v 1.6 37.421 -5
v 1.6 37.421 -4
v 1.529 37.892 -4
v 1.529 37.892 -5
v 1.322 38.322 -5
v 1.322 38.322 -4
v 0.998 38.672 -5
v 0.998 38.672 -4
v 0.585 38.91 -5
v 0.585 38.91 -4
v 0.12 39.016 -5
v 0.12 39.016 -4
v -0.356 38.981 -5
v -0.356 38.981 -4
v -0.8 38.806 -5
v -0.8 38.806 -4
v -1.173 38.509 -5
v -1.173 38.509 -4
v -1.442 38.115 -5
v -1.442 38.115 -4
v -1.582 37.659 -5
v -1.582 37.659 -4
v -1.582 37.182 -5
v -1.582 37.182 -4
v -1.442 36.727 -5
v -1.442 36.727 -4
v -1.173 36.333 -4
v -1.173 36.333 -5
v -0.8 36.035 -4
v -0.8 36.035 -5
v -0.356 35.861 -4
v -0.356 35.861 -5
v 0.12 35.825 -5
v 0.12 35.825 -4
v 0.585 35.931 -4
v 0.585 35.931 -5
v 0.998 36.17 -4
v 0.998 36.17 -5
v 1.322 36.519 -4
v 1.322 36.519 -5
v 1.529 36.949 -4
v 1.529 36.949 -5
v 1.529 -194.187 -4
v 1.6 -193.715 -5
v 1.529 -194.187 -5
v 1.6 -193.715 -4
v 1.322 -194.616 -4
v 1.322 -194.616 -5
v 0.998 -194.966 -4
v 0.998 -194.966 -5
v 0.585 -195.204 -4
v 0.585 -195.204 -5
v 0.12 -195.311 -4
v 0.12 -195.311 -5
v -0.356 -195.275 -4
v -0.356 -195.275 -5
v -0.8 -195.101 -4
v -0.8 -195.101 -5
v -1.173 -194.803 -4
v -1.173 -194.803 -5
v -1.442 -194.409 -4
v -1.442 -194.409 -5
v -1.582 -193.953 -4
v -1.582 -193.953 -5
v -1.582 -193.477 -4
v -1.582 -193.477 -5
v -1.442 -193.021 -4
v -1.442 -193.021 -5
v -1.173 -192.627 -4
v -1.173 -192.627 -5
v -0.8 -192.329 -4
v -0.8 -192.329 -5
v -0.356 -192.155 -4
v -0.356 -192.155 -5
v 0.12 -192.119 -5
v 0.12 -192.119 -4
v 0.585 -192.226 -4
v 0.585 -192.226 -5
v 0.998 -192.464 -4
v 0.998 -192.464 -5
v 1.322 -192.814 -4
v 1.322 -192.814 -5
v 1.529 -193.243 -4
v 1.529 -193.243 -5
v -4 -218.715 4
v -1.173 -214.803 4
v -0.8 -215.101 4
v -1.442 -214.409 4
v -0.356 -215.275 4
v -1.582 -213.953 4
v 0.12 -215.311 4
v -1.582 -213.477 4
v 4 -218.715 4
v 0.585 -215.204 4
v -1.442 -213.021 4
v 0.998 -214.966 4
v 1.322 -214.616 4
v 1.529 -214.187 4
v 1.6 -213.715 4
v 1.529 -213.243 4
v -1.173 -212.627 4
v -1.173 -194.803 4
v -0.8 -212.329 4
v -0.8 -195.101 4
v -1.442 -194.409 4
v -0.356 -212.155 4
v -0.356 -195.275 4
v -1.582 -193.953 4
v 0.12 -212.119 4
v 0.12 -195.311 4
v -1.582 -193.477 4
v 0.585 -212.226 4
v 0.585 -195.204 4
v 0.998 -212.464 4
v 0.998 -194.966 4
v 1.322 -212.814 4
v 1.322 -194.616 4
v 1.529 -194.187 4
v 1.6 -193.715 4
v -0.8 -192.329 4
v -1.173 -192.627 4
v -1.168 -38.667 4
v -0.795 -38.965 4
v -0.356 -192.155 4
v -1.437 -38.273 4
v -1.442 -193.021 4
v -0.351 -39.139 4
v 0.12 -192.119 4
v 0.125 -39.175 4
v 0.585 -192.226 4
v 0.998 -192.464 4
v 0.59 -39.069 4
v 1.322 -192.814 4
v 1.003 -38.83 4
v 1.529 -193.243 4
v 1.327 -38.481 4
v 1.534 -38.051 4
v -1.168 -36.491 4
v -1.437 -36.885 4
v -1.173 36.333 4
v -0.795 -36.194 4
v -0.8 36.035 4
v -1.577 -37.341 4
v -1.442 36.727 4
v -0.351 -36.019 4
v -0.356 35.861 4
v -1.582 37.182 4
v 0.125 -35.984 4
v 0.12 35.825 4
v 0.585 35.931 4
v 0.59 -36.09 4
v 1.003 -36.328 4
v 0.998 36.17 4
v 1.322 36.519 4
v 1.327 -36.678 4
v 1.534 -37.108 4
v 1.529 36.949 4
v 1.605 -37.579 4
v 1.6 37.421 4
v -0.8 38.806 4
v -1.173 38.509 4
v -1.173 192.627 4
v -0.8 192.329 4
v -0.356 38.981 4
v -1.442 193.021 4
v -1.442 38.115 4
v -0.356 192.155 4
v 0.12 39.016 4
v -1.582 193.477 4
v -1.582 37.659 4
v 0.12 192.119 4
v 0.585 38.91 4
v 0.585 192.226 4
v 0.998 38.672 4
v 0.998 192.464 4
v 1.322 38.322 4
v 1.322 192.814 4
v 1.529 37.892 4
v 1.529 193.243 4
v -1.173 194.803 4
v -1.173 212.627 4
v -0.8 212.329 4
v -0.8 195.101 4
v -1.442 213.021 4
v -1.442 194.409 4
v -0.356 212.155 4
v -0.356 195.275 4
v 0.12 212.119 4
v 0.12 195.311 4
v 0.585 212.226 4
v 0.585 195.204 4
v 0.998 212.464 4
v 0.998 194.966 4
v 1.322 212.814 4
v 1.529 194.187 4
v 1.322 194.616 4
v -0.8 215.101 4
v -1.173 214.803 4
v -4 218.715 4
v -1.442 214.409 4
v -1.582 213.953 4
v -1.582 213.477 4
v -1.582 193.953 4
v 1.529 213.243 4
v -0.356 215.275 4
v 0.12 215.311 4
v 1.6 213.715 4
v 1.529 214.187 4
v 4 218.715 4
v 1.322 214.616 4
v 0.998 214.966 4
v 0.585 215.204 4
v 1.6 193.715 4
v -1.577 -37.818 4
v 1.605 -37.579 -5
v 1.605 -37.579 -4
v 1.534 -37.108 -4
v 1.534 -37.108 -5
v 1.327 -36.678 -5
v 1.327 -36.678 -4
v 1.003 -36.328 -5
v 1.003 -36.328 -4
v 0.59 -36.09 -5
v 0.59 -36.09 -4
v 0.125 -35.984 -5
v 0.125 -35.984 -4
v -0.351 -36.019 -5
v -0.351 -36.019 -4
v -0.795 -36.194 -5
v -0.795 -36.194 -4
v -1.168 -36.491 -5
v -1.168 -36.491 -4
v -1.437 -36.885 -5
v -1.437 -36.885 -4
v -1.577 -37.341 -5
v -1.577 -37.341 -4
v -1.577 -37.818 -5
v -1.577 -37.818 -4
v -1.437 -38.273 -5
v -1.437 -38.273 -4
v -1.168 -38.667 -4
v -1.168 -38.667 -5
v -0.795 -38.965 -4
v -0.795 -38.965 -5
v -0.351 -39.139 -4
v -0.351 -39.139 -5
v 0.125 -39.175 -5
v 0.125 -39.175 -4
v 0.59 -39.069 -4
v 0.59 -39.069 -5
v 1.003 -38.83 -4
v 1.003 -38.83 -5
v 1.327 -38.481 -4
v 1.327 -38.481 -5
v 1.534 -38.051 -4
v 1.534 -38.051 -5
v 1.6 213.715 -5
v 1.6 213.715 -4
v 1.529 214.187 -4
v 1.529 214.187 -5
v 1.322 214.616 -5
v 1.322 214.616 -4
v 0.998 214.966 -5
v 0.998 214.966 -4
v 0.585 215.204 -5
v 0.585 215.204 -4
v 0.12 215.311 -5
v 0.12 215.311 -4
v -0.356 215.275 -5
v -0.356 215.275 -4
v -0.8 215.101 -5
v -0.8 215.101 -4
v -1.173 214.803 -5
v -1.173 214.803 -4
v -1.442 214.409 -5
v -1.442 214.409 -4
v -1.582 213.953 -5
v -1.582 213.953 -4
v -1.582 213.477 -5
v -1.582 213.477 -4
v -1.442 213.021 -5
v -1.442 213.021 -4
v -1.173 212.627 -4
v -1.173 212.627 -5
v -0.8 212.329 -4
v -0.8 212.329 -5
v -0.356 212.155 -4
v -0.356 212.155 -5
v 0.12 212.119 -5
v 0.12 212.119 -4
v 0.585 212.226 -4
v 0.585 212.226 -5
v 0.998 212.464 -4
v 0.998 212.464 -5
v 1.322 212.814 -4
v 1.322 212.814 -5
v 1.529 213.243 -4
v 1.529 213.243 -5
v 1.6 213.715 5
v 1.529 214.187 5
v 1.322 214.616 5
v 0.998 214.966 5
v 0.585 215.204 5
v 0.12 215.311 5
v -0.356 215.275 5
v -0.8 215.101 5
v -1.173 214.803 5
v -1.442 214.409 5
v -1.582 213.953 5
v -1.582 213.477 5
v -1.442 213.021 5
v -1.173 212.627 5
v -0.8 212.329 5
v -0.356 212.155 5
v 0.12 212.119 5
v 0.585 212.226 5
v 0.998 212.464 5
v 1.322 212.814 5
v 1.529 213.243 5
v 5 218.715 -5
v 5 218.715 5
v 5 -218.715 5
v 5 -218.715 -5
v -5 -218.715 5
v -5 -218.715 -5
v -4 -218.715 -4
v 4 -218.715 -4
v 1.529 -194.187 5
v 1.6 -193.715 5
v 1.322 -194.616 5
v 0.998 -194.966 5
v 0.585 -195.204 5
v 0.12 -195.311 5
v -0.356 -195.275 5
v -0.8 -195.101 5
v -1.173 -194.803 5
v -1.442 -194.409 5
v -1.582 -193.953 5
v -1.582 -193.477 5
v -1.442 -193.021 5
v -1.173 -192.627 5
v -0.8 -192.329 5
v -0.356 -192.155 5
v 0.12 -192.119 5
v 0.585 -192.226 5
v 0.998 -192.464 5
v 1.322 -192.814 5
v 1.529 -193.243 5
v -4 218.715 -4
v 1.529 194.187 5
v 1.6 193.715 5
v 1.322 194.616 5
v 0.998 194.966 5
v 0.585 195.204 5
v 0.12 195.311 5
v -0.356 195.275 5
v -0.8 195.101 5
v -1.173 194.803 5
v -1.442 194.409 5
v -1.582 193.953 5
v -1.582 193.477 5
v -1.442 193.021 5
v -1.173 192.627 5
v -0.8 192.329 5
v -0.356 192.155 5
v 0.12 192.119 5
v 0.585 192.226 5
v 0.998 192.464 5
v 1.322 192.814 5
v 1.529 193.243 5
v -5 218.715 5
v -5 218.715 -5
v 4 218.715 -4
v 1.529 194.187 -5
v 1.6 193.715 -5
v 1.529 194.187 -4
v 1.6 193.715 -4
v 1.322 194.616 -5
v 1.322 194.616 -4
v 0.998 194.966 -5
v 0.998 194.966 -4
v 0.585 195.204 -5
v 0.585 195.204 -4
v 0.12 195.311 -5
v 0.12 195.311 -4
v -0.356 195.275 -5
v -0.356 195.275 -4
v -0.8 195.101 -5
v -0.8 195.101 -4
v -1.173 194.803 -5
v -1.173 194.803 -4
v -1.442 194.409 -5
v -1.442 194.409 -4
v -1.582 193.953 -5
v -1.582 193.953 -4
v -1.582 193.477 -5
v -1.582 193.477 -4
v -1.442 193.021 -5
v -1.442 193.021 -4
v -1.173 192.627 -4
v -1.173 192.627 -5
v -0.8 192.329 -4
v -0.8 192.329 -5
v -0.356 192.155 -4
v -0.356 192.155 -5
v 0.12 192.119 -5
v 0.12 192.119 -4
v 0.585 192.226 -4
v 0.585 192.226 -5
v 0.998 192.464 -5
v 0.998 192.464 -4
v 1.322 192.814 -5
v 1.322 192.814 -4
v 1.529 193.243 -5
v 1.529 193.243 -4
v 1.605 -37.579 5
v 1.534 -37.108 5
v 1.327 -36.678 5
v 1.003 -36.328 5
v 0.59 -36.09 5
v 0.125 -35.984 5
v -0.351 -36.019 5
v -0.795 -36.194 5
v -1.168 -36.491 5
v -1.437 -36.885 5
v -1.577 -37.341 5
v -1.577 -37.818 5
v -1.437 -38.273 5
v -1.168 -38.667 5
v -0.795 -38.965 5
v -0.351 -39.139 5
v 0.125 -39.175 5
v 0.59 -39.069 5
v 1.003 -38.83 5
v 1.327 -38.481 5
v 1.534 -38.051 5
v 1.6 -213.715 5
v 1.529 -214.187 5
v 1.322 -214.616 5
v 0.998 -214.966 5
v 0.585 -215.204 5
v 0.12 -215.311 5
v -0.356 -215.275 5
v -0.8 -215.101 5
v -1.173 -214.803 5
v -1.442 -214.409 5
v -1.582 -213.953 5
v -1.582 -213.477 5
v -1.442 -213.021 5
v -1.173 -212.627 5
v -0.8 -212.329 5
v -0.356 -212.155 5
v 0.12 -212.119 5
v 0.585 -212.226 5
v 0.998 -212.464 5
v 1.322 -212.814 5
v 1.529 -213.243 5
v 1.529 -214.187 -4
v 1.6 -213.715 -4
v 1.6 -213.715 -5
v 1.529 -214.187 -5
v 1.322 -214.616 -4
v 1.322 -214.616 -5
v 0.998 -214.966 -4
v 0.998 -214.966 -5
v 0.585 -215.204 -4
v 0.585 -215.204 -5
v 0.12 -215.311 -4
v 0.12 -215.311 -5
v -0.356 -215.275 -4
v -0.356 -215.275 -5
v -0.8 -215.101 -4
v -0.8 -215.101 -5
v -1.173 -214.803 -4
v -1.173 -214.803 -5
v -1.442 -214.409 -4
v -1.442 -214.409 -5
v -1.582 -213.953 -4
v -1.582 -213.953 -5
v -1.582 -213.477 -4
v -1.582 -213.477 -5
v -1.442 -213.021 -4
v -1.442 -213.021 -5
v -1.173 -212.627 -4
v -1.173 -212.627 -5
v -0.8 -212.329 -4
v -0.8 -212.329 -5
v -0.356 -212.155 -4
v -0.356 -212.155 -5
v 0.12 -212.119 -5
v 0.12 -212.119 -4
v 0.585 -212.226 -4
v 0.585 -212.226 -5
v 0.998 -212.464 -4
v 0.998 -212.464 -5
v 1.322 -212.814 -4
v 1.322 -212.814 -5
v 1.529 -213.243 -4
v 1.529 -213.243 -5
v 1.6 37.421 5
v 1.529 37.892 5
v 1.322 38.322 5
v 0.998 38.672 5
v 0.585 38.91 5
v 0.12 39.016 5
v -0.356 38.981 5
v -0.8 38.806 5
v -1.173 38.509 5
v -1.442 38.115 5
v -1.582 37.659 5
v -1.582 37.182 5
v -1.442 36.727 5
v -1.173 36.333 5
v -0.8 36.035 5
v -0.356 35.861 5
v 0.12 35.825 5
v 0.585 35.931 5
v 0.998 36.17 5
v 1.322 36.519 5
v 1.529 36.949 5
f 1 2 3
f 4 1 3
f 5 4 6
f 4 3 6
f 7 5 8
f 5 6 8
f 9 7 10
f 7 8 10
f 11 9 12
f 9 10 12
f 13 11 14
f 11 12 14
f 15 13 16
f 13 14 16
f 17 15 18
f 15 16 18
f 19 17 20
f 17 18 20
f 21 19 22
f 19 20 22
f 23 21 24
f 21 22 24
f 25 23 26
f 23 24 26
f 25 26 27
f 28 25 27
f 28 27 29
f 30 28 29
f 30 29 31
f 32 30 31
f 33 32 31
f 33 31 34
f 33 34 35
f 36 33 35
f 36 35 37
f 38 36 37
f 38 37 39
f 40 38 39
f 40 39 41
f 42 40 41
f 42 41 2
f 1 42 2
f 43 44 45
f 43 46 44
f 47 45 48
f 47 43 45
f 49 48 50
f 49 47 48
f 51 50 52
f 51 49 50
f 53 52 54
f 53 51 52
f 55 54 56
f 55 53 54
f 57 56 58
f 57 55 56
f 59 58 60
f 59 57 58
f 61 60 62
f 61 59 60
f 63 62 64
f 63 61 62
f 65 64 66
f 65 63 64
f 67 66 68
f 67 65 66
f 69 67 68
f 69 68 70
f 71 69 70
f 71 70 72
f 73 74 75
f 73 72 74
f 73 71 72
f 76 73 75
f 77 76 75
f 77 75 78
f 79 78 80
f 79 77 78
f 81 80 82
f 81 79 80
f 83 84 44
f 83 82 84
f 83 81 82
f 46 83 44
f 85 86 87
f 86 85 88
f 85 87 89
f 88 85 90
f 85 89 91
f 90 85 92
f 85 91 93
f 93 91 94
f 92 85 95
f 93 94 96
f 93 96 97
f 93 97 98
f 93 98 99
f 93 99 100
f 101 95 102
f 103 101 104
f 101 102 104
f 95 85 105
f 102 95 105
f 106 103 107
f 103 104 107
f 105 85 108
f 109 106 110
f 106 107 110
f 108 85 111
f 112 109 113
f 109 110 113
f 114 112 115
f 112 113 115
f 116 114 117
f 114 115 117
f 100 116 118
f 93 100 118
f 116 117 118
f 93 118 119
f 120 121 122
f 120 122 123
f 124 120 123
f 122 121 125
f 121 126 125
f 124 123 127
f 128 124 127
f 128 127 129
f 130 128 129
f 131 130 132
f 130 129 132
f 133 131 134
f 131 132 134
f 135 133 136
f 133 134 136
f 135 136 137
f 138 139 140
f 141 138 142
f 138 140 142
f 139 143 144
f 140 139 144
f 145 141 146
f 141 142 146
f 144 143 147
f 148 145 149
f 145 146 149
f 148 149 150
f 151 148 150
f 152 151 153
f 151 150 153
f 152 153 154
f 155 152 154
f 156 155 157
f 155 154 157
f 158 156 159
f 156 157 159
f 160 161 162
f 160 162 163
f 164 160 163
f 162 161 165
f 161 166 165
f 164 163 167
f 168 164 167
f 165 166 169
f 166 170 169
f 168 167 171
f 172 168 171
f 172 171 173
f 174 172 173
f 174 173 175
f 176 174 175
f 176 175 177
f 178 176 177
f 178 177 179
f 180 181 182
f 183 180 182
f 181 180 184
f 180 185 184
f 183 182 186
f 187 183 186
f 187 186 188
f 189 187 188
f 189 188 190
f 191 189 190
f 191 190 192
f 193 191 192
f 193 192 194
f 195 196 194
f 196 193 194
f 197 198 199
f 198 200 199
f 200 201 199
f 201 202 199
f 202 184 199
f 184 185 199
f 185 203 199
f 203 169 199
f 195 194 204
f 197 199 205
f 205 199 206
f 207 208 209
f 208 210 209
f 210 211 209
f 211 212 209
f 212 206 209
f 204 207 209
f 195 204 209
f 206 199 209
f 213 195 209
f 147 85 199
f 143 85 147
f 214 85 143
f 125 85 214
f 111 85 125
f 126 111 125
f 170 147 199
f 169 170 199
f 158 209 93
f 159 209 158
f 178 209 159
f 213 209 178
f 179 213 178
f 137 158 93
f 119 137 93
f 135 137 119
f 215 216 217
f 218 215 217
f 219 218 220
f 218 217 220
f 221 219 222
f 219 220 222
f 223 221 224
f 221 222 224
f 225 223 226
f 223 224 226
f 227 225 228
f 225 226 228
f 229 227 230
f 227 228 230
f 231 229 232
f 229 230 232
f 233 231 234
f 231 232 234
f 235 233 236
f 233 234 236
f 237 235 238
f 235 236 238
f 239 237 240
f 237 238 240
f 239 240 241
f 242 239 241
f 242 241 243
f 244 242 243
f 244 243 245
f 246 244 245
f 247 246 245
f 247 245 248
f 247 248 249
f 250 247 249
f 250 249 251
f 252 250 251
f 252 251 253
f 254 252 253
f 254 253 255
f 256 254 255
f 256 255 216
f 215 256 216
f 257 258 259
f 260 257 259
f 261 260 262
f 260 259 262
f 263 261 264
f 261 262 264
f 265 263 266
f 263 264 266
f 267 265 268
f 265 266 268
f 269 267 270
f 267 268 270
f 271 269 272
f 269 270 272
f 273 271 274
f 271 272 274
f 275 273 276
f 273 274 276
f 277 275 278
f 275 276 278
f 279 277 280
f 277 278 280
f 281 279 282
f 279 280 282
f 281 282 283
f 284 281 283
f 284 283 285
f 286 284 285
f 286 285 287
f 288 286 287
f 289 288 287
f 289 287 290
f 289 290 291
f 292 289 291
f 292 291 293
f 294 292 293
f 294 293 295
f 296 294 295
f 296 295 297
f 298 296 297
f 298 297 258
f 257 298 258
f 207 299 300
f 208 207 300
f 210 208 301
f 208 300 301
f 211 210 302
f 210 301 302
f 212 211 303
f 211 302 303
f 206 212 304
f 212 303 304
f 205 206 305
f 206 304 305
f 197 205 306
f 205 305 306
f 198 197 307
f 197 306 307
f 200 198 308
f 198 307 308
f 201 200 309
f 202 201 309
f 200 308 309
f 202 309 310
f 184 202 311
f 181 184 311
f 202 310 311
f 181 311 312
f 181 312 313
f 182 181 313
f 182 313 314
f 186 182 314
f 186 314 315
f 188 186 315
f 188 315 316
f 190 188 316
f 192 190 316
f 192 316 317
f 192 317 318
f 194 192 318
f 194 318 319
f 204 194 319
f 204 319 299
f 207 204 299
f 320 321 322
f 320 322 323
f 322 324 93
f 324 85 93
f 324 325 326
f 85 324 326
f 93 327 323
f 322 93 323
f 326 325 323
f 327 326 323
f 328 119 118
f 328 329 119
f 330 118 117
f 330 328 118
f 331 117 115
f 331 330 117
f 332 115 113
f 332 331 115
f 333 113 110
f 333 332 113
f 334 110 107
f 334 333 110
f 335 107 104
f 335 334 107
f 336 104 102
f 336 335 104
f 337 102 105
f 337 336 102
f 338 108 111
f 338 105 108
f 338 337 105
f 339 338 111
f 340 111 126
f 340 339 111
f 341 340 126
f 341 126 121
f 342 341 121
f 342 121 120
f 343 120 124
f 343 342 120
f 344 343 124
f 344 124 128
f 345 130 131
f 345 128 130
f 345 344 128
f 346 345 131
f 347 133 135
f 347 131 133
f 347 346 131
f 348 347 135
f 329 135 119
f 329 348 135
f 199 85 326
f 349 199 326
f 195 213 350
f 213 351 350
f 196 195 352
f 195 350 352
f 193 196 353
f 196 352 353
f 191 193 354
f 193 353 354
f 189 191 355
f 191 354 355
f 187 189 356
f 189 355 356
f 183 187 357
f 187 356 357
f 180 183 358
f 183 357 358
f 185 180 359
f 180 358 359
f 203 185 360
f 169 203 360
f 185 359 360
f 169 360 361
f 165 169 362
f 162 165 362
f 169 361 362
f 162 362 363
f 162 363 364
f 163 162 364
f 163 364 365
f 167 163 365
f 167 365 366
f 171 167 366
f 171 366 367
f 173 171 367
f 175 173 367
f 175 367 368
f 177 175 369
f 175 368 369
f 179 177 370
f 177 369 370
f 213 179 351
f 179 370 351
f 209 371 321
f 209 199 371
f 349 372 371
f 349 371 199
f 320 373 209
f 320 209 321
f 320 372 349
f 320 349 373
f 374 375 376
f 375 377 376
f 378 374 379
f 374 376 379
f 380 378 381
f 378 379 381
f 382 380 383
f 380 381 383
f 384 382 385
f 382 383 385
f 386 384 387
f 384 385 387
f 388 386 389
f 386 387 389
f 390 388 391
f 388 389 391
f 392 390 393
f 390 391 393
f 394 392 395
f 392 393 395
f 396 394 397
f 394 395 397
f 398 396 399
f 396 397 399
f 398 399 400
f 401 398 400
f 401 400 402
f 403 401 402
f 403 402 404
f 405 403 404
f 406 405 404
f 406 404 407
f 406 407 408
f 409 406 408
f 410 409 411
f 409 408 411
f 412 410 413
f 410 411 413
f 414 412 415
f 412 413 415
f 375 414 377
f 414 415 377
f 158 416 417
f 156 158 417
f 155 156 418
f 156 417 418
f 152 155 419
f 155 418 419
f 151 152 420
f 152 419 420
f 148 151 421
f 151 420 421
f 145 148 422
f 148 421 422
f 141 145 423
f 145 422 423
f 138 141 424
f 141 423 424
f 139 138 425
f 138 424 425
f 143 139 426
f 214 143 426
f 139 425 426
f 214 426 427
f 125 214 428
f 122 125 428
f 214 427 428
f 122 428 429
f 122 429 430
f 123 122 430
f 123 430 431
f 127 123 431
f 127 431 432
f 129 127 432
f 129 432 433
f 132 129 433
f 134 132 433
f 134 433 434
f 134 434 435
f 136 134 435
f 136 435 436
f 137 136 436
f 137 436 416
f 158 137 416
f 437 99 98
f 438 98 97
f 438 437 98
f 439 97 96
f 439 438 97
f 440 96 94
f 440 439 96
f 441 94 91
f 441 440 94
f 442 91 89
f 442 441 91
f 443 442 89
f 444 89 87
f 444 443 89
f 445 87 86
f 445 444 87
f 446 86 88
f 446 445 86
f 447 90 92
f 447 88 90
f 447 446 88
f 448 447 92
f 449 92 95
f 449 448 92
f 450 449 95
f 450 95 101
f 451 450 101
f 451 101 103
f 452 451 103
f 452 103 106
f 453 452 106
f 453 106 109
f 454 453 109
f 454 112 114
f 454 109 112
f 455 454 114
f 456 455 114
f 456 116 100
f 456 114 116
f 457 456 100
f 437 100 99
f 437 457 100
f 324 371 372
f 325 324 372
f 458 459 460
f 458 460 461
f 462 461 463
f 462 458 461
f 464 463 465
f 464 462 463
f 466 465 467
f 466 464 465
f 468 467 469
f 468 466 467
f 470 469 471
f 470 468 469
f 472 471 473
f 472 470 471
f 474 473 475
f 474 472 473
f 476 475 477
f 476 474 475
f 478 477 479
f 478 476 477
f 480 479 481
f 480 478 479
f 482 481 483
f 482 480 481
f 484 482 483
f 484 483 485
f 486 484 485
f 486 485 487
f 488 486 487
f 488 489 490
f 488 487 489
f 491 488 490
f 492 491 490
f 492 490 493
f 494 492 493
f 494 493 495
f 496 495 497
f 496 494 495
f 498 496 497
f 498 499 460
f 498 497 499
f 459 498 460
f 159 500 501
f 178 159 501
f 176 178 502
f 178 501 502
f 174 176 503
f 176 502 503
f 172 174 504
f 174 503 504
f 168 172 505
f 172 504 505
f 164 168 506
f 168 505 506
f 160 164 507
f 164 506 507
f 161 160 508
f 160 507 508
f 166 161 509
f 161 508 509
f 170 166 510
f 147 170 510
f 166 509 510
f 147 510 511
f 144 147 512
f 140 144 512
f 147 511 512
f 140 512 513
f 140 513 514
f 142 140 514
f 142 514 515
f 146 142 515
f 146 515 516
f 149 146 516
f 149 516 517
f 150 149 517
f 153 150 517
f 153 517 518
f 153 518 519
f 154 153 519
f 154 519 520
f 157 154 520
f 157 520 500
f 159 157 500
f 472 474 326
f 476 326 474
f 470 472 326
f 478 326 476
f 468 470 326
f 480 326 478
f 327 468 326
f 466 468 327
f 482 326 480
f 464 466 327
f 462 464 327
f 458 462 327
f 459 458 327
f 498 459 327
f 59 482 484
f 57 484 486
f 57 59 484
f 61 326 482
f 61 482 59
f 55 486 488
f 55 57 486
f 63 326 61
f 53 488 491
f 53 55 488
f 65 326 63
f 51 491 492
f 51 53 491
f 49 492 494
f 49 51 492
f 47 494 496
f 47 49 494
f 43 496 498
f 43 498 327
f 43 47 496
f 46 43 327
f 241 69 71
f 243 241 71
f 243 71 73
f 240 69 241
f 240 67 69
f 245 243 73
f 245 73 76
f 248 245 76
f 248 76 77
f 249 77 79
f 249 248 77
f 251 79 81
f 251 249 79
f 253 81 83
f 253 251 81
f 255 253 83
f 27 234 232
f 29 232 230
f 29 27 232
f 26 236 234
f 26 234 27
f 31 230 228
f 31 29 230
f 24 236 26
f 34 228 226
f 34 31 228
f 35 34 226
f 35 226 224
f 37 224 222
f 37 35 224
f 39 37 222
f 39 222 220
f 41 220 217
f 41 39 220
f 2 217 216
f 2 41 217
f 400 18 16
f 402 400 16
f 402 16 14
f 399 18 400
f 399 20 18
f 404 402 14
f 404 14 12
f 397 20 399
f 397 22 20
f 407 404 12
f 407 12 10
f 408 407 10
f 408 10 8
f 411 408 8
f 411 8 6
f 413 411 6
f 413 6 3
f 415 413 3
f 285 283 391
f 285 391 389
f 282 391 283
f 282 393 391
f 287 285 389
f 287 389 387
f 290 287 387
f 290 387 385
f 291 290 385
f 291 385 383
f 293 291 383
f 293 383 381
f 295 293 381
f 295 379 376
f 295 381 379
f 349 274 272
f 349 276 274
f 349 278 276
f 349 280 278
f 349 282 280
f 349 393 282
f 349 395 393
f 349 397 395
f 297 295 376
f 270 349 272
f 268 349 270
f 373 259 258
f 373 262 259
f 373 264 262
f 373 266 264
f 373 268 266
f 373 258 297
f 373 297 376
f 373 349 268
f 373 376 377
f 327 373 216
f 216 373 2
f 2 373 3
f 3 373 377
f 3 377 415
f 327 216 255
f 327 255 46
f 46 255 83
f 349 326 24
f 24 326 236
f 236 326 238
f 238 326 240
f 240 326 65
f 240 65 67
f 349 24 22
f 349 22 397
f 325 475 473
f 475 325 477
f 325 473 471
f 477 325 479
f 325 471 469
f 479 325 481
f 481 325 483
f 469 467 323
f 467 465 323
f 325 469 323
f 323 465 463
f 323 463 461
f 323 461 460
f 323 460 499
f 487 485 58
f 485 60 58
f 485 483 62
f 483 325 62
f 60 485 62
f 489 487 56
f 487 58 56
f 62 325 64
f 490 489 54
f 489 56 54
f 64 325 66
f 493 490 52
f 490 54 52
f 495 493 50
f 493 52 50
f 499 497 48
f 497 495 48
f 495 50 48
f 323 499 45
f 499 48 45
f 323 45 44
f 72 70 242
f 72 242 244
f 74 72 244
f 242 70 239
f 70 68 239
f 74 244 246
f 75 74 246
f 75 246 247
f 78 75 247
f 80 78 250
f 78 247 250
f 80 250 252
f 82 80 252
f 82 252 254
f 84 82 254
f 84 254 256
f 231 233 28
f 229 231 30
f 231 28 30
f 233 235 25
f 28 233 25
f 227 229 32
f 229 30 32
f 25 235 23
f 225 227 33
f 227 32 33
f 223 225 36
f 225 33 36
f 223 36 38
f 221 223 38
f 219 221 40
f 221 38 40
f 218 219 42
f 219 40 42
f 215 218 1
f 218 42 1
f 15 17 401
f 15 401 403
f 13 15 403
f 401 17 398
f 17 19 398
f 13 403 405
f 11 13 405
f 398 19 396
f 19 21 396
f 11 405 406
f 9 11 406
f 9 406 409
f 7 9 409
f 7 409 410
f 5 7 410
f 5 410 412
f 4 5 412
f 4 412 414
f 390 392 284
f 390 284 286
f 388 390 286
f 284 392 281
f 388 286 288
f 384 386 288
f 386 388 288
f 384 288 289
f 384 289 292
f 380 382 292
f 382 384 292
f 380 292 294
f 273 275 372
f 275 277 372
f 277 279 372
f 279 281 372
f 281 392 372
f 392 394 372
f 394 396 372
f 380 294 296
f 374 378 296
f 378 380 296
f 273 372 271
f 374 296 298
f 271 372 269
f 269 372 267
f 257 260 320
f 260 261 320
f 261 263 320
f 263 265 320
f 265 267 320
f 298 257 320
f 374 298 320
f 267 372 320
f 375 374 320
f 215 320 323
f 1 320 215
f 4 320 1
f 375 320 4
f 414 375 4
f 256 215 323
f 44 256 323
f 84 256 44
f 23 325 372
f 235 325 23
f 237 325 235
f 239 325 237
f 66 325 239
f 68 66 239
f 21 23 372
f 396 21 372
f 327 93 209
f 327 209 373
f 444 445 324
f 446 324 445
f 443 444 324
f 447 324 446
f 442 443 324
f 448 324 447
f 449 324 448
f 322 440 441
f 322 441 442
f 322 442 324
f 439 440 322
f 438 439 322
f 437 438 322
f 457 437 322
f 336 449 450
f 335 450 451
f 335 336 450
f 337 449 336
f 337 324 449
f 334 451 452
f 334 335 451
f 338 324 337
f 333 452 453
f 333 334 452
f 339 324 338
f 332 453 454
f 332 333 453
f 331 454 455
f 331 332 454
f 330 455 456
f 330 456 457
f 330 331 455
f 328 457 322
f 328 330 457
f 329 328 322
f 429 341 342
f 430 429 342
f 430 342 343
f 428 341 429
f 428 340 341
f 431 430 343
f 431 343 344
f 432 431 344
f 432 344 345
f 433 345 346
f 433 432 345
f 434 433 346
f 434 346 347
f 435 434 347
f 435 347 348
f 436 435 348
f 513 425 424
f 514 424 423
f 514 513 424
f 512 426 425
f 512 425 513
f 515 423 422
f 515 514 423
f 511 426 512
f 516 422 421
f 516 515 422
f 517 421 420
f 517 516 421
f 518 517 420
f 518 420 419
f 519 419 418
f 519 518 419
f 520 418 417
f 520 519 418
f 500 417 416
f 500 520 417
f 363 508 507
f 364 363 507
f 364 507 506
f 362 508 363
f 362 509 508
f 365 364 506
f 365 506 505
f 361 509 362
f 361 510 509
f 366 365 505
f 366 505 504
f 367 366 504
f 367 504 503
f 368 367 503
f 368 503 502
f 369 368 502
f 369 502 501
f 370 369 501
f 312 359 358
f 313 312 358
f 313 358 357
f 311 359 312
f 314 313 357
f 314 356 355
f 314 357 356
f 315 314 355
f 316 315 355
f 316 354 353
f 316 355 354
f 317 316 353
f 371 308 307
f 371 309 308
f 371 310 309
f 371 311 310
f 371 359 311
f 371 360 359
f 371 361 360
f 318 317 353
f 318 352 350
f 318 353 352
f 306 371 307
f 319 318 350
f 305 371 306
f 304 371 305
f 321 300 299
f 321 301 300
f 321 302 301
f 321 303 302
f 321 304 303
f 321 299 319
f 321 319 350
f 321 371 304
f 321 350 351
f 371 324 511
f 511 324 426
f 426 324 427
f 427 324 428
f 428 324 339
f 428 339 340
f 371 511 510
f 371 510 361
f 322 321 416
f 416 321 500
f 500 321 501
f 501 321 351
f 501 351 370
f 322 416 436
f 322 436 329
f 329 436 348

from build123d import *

# Parameters (mm, degrees)
SKETCH_1_W          = 10
SKETCH_1_H          = 10
SKETCH_1_W_2        = 8
SKETCH_1_H_2        = 8
EXTRUDE_1_DEPTH     = 218.715
SKETCH_2_R          = 1.6
CUT_EXTRUDE_1_DEPTH = 213.715
SKETCH_3_R          = 1.6
CUT_EXTRUDE_2_DEPTH = 10


with BuildPart() as part:
    # ｽｹｯﾁ1 → ﾎﾞｽ - 押し出し1 (new, symmetric)
    with BuildSketch(Plane(origin=(0, 0, 0), x_dir=(1, 0, 0), z_dir=(0, 1, 0))):
        Rectangle(SKETCH_1_W, SKETCH_1_H)
        Rectangle(SKETCH_1_W_2, SKETCH_1_H_2, mode=Mode.SUBTRACT)
    extrude(amount=EXTRUDE_1_DEPTH, both=True)

    # ｽｹｯﾁ2 → ｶｯﾄ - 押し出し1 (cut, symmetric)
    with BuildSketch(Plane.XY.offset(5)):
        with Locations((0, 213.715)):
            Circle(SKETCH_2_R)
        with Locations((0, 193.715)):
            Circle(SKETCH_2_R)
    cut_extrude_1 = extrude(amount=CUT_EXTRUDE_1_DEPTH, both=True, mode=Mode.SUBTRACT)

    # ﾐﾗｰ1: ｶｯﾄ - 押し出し1 across plane
    add(cut_extrude_1.mirror(Plane.ZX), mode=Mode.SUBTRACT)

    # ｽｹｯﾁ3 → ｶｯﾄ - 押し出し2 (cut)
    with BuildSketch(Plane.XY.offset(5)):
        with Locations((0.004997943, -37.579217745)):
            Circle(SKETCH_3_R)
        with Locations((-1.455e-06, 37.420782255)):
            Circle(SKETCH_3_R)
    extrude(amount=-CUT_EXTRUDE_2_DEPTH, mode=Mode.SUBTRACT)


solid = part.part
